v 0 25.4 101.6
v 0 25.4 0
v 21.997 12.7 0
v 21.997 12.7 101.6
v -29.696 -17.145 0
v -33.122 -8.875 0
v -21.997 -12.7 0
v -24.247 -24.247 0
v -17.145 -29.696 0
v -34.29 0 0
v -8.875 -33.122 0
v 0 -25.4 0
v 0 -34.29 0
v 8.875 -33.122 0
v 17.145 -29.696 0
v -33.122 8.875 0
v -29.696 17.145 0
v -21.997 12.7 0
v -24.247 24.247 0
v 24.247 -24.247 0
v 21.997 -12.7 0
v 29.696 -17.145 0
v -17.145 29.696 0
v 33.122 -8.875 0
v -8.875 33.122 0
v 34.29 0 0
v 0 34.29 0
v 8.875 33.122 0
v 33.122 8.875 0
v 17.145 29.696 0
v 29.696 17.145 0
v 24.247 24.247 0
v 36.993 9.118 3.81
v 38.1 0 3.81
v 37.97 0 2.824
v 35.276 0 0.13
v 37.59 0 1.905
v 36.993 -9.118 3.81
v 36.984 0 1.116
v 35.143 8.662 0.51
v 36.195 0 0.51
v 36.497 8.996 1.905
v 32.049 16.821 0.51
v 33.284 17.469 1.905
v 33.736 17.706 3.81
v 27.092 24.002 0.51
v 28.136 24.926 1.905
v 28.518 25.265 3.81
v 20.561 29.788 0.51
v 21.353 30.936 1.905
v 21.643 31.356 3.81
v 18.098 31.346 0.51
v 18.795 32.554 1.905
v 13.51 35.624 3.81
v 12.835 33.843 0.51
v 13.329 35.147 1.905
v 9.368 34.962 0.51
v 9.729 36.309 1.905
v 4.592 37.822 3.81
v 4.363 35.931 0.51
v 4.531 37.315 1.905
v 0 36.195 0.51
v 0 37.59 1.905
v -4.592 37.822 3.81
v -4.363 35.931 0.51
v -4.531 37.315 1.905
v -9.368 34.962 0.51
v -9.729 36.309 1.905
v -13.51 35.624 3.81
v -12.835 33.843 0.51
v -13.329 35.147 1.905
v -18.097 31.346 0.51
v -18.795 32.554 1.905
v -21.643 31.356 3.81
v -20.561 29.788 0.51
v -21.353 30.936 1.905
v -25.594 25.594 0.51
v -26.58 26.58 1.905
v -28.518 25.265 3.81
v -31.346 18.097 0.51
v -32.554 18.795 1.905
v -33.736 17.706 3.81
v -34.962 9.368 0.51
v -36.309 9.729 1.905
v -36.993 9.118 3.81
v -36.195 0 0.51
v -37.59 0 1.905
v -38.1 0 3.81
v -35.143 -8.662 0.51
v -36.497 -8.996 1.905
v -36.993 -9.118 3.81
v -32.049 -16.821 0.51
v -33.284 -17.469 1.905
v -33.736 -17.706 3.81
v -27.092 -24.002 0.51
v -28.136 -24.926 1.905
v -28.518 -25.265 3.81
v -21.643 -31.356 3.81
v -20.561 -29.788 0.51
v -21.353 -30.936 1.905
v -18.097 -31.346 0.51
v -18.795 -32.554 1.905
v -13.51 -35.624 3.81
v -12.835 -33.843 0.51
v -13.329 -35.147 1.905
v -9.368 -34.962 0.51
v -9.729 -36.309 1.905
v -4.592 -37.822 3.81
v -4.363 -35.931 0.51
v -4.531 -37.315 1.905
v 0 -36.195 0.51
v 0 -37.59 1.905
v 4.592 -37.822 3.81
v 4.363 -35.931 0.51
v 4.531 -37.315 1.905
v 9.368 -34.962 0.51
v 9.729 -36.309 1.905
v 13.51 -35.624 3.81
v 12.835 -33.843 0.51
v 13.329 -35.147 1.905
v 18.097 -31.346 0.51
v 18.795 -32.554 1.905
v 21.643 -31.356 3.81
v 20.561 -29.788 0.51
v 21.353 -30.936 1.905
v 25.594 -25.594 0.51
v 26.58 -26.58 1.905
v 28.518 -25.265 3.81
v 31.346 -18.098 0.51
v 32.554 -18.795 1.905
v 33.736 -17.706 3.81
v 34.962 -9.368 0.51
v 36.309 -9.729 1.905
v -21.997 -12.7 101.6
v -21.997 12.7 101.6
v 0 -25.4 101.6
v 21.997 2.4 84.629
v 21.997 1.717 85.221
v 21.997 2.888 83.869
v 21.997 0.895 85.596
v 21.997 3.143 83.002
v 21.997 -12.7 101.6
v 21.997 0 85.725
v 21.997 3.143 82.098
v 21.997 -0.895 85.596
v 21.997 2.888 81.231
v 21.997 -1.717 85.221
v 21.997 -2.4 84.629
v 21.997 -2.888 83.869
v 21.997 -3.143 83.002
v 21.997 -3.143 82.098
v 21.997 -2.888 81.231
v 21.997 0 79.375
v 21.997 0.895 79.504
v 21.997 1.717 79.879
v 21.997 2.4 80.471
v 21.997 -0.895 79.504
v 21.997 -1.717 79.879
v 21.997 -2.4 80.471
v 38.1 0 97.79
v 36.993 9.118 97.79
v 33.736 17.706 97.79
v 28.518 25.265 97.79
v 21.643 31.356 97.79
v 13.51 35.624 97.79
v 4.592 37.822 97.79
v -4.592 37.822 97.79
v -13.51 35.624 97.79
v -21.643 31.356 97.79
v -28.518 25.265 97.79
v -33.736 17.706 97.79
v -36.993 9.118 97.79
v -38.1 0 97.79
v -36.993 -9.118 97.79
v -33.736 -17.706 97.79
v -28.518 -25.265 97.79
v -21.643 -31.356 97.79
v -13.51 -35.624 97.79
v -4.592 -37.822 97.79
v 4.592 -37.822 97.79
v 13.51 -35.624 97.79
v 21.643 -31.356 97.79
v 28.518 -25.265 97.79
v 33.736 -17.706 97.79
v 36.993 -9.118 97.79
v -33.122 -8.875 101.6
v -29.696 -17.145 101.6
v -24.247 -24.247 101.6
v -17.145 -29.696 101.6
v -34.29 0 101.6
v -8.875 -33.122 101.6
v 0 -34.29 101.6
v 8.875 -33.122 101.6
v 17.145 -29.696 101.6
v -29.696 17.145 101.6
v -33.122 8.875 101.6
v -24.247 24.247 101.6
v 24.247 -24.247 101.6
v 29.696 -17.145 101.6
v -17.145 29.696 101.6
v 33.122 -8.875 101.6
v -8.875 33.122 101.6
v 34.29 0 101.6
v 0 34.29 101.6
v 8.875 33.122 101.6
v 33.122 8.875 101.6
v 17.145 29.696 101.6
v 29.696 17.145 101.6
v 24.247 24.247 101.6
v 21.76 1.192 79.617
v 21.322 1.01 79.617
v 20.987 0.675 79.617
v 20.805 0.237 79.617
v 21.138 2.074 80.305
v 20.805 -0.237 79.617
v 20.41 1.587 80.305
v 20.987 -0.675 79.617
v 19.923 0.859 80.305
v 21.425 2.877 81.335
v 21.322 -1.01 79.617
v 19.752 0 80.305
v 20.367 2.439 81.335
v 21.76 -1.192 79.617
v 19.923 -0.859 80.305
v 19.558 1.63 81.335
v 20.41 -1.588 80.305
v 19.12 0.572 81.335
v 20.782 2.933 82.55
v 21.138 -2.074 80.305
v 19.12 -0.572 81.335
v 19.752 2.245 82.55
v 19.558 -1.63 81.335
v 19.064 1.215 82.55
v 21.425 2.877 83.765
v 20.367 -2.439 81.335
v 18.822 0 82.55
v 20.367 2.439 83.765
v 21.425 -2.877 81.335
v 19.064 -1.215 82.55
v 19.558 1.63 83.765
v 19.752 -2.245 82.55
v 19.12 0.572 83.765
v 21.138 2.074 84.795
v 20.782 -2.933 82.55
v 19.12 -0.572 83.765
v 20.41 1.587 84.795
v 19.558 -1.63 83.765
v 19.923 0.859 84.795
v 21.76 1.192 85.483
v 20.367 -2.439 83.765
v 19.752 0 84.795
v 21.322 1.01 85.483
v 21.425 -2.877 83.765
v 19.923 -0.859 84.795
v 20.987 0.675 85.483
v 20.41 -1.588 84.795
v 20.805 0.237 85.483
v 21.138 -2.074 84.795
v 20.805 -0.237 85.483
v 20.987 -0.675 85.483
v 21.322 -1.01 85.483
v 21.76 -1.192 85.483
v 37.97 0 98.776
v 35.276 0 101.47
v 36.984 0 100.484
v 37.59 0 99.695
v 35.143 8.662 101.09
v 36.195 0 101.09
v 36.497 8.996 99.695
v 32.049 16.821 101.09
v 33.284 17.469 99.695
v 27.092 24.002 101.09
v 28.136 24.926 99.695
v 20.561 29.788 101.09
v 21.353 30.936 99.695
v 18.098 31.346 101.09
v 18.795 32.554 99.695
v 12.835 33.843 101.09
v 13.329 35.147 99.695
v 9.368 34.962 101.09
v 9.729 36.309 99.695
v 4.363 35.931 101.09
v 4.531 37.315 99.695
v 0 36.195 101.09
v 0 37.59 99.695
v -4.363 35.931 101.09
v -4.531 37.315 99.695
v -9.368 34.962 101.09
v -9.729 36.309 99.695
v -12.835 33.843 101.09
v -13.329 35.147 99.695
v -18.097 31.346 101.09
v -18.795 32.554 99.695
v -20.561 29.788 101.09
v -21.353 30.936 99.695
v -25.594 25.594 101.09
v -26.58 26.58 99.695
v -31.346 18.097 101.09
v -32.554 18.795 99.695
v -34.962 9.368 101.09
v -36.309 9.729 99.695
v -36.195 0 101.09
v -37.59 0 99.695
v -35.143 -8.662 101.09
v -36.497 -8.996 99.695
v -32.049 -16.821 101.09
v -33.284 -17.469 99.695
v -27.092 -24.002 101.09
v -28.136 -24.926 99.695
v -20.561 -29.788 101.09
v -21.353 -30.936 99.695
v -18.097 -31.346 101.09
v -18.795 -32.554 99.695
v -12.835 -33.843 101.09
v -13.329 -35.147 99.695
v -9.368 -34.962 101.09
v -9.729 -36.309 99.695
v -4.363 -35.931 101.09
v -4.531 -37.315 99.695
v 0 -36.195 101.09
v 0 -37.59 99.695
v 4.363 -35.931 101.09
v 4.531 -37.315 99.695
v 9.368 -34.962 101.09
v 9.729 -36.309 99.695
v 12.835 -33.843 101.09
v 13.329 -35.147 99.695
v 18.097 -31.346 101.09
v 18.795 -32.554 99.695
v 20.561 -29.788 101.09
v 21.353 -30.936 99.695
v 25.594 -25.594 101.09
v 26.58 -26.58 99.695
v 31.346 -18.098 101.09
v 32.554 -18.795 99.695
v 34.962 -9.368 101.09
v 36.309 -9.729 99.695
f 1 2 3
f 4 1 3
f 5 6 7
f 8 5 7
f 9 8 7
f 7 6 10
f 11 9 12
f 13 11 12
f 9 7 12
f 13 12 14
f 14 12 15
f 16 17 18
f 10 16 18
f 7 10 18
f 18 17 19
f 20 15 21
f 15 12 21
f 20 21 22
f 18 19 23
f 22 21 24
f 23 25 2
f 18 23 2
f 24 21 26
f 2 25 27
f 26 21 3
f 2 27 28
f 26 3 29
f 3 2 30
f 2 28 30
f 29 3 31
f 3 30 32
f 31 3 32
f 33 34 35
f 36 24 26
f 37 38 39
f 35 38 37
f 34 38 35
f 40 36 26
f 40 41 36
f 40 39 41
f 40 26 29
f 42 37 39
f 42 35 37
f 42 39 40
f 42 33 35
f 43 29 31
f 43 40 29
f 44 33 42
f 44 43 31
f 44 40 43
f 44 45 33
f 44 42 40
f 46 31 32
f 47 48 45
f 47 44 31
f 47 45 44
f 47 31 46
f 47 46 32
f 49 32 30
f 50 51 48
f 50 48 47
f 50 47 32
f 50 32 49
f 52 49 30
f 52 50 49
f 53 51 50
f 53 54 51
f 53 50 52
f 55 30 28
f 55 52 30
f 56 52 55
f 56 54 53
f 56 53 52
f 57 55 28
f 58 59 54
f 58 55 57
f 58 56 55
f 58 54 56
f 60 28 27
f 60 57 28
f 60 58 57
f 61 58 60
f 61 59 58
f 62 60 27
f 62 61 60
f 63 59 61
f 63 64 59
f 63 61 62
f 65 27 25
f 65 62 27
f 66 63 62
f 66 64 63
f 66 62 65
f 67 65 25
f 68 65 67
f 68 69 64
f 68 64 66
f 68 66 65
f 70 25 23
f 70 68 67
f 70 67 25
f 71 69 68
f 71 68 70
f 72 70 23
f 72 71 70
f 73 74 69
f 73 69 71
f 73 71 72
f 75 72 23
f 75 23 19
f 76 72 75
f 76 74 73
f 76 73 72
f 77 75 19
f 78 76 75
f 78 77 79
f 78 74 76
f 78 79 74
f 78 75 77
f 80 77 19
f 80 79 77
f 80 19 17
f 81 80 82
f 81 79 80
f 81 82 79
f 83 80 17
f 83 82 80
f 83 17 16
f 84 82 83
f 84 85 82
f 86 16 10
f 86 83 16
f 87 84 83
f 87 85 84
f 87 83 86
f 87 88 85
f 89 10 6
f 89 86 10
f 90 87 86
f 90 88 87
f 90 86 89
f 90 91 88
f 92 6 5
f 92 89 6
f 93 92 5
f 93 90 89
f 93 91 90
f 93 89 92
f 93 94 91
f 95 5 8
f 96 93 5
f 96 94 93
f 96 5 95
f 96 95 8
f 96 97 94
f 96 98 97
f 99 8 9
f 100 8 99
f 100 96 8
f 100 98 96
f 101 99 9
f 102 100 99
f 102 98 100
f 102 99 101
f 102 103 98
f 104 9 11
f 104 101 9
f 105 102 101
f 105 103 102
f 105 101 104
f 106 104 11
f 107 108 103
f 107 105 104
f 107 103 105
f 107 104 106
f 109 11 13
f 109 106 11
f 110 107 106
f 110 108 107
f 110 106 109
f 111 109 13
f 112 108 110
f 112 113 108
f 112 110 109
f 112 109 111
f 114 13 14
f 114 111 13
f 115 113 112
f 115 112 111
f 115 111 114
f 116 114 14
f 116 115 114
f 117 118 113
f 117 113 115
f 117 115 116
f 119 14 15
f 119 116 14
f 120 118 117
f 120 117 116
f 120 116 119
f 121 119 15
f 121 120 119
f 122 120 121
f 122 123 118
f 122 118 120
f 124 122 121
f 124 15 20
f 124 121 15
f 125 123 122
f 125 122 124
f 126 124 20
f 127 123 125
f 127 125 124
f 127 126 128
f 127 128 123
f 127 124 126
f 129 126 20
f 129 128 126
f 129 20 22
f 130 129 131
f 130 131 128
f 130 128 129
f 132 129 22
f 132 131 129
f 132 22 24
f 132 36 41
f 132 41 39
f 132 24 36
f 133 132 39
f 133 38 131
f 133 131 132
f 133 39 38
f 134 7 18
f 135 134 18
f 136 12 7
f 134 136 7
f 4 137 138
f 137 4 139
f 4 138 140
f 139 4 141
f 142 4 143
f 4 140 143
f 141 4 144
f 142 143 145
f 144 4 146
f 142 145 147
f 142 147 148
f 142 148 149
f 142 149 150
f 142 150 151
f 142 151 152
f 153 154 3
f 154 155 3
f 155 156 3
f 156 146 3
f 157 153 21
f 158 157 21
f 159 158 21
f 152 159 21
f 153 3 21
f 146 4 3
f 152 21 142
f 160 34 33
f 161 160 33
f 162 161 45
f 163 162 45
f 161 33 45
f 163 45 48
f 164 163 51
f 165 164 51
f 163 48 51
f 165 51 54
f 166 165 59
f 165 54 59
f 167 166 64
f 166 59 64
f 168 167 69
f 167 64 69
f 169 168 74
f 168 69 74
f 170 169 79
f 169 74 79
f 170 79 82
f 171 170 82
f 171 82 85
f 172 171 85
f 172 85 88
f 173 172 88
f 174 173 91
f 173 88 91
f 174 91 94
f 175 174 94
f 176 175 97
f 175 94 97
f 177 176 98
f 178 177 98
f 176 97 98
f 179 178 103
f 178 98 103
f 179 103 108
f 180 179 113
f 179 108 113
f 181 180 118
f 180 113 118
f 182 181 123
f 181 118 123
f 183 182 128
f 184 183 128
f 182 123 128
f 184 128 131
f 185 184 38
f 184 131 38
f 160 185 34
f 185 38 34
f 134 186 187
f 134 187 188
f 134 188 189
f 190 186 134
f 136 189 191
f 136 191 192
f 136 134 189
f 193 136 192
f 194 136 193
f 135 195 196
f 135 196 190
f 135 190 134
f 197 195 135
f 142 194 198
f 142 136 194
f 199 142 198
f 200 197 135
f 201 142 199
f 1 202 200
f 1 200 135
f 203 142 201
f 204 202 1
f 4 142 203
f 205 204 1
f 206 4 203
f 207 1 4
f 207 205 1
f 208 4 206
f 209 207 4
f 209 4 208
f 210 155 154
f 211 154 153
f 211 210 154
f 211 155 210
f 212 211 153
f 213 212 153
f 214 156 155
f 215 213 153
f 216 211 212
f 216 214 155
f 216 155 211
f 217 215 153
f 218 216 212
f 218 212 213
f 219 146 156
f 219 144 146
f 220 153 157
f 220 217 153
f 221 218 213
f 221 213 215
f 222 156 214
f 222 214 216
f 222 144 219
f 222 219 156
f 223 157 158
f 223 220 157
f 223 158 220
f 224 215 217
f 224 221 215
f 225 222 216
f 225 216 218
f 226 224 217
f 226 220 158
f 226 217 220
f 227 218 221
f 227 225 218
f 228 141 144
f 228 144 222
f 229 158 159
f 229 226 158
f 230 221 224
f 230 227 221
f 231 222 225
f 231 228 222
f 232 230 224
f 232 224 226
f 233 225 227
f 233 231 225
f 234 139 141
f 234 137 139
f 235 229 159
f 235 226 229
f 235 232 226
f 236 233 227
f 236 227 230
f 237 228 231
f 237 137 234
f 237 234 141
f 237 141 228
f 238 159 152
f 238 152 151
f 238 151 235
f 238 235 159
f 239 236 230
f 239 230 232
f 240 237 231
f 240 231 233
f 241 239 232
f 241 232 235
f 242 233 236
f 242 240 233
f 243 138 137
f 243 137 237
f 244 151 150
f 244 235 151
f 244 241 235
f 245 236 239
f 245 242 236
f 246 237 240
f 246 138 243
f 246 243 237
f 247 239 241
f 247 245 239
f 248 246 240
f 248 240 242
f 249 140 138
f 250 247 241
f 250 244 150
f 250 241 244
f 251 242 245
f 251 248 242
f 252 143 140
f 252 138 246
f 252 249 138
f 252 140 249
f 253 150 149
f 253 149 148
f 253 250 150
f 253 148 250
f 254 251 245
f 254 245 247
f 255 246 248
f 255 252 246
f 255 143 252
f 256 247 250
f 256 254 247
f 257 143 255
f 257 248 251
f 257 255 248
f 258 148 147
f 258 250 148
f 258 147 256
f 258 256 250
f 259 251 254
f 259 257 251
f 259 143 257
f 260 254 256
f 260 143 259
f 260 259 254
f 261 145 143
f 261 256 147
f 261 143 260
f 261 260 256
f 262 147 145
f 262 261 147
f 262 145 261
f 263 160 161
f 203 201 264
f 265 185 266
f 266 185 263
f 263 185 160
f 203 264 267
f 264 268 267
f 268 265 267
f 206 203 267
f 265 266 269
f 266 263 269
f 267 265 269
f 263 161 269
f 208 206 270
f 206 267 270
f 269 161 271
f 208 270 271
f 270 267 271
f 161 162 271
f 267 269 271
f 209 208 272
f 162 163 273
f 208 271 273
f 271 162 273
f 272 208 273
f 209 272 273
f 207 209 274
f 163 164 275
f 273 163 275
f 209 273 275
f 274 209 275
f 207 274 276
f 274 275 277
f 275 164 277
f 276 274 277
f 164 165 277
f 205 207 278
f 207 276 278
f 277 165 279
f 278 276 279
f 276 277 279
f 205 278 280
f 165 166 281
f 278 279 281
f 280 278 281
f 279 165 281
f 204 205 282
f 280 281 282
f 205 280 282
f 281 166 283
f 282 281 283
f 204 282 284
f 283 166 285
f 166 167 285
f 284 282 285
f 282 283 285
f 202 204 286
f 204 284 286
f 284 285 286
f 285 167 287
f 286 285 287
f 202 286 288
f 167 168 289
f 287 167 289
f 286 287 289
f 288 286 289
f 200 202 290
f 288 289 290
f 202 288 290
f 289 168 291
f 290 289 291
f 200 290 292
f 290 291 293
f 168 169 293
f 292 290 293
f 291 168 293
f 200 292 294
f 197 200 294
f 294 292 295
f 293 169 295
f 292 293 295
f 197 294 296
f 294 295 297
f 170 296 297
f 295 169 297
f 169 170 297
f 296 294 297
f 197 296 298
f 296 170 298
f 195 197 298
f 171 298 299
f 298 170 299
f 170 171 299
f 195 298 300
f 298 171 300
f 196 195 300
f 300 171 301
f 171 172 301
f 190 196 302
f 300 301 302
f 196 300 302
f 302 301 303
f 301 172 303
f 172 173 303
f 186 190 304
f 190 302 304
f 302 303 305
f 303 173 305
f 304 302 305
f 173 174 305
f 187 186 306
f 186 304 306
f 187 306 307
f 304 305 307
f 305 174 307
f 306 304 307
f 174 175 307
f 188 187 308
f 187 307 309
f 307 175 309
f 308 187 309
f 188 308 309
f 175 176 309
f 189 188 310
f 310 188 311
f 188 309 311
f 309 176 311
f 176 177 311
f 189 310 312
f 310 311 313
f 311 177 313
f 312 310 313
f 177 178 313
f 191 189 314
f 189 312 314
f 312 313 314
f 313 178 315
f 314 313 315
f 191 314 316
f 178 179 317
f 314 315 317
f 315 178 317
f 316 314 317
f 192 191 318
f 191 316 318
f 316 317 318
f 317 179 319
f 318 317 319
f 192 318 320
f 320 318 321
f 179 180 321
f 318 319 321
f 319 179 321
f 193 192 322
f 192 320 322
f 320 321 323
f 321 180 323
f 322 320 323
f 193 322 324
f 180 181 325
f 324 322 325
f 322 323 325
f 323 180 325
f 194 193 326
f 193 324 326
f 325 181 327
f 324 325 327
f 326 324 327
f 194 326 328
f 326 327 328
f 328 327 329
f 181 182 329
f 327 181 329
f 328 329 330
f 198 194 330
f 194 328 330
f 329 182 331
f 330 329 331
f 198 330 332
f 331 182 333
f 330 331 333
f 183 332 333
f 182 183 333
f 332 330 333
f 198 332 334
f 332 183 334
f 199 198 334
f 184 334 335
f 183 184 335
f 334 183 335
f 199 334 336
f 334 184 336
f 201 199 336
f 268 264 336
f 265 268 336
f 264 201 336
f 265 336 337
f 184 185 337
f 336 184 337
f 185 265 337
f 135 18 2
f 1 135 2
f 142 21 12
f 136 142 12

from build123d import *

# Parameters (mm, degrees)
F0_R     = 38.1
F1_DEPTH = 101.6
F4_R     = 3.81


with BuildPart() as f1:
    # F0 (on Top) → F1 (new body)
    with BuildSketch(Plane.XY):
        Circle(F0_R)
        Polygon((-21.997045, 12.7), (0, 25.4), (21.997045, 12.7), (21.997045, -12.7), (0, -25.4), (-21.997045, -12.7), align=None, mode=Mode.SUBTRACT)
    extrude(amount=F1_DEPTH)

    # F2 (on face) → F3 (revolve)
    with BuildSketch(Plane(origin=(21.997045, 0, 0), x_dir=(0, -1, 0), z_dir=(-1, 0, 0))):
        with BuildLine():
            Line((0, 85.725), (0, 79.375))
            ThreePointArc((0, 79.375), (3.175, 82.55), (0, 85.725))
        make_face()
    revolve(axis=Axis((21.997045, 0, 82.55), (0, 0, 1)))

    # F4
    f4_edges = [f1.edges().sort_by_distance(p)[0] for p in [
        (-38.1, 0, 0),
        (-38.1, 0, 101.6),
    ]]
    fillet(f4_edges, radius=F4_R)


solid = f1.part
